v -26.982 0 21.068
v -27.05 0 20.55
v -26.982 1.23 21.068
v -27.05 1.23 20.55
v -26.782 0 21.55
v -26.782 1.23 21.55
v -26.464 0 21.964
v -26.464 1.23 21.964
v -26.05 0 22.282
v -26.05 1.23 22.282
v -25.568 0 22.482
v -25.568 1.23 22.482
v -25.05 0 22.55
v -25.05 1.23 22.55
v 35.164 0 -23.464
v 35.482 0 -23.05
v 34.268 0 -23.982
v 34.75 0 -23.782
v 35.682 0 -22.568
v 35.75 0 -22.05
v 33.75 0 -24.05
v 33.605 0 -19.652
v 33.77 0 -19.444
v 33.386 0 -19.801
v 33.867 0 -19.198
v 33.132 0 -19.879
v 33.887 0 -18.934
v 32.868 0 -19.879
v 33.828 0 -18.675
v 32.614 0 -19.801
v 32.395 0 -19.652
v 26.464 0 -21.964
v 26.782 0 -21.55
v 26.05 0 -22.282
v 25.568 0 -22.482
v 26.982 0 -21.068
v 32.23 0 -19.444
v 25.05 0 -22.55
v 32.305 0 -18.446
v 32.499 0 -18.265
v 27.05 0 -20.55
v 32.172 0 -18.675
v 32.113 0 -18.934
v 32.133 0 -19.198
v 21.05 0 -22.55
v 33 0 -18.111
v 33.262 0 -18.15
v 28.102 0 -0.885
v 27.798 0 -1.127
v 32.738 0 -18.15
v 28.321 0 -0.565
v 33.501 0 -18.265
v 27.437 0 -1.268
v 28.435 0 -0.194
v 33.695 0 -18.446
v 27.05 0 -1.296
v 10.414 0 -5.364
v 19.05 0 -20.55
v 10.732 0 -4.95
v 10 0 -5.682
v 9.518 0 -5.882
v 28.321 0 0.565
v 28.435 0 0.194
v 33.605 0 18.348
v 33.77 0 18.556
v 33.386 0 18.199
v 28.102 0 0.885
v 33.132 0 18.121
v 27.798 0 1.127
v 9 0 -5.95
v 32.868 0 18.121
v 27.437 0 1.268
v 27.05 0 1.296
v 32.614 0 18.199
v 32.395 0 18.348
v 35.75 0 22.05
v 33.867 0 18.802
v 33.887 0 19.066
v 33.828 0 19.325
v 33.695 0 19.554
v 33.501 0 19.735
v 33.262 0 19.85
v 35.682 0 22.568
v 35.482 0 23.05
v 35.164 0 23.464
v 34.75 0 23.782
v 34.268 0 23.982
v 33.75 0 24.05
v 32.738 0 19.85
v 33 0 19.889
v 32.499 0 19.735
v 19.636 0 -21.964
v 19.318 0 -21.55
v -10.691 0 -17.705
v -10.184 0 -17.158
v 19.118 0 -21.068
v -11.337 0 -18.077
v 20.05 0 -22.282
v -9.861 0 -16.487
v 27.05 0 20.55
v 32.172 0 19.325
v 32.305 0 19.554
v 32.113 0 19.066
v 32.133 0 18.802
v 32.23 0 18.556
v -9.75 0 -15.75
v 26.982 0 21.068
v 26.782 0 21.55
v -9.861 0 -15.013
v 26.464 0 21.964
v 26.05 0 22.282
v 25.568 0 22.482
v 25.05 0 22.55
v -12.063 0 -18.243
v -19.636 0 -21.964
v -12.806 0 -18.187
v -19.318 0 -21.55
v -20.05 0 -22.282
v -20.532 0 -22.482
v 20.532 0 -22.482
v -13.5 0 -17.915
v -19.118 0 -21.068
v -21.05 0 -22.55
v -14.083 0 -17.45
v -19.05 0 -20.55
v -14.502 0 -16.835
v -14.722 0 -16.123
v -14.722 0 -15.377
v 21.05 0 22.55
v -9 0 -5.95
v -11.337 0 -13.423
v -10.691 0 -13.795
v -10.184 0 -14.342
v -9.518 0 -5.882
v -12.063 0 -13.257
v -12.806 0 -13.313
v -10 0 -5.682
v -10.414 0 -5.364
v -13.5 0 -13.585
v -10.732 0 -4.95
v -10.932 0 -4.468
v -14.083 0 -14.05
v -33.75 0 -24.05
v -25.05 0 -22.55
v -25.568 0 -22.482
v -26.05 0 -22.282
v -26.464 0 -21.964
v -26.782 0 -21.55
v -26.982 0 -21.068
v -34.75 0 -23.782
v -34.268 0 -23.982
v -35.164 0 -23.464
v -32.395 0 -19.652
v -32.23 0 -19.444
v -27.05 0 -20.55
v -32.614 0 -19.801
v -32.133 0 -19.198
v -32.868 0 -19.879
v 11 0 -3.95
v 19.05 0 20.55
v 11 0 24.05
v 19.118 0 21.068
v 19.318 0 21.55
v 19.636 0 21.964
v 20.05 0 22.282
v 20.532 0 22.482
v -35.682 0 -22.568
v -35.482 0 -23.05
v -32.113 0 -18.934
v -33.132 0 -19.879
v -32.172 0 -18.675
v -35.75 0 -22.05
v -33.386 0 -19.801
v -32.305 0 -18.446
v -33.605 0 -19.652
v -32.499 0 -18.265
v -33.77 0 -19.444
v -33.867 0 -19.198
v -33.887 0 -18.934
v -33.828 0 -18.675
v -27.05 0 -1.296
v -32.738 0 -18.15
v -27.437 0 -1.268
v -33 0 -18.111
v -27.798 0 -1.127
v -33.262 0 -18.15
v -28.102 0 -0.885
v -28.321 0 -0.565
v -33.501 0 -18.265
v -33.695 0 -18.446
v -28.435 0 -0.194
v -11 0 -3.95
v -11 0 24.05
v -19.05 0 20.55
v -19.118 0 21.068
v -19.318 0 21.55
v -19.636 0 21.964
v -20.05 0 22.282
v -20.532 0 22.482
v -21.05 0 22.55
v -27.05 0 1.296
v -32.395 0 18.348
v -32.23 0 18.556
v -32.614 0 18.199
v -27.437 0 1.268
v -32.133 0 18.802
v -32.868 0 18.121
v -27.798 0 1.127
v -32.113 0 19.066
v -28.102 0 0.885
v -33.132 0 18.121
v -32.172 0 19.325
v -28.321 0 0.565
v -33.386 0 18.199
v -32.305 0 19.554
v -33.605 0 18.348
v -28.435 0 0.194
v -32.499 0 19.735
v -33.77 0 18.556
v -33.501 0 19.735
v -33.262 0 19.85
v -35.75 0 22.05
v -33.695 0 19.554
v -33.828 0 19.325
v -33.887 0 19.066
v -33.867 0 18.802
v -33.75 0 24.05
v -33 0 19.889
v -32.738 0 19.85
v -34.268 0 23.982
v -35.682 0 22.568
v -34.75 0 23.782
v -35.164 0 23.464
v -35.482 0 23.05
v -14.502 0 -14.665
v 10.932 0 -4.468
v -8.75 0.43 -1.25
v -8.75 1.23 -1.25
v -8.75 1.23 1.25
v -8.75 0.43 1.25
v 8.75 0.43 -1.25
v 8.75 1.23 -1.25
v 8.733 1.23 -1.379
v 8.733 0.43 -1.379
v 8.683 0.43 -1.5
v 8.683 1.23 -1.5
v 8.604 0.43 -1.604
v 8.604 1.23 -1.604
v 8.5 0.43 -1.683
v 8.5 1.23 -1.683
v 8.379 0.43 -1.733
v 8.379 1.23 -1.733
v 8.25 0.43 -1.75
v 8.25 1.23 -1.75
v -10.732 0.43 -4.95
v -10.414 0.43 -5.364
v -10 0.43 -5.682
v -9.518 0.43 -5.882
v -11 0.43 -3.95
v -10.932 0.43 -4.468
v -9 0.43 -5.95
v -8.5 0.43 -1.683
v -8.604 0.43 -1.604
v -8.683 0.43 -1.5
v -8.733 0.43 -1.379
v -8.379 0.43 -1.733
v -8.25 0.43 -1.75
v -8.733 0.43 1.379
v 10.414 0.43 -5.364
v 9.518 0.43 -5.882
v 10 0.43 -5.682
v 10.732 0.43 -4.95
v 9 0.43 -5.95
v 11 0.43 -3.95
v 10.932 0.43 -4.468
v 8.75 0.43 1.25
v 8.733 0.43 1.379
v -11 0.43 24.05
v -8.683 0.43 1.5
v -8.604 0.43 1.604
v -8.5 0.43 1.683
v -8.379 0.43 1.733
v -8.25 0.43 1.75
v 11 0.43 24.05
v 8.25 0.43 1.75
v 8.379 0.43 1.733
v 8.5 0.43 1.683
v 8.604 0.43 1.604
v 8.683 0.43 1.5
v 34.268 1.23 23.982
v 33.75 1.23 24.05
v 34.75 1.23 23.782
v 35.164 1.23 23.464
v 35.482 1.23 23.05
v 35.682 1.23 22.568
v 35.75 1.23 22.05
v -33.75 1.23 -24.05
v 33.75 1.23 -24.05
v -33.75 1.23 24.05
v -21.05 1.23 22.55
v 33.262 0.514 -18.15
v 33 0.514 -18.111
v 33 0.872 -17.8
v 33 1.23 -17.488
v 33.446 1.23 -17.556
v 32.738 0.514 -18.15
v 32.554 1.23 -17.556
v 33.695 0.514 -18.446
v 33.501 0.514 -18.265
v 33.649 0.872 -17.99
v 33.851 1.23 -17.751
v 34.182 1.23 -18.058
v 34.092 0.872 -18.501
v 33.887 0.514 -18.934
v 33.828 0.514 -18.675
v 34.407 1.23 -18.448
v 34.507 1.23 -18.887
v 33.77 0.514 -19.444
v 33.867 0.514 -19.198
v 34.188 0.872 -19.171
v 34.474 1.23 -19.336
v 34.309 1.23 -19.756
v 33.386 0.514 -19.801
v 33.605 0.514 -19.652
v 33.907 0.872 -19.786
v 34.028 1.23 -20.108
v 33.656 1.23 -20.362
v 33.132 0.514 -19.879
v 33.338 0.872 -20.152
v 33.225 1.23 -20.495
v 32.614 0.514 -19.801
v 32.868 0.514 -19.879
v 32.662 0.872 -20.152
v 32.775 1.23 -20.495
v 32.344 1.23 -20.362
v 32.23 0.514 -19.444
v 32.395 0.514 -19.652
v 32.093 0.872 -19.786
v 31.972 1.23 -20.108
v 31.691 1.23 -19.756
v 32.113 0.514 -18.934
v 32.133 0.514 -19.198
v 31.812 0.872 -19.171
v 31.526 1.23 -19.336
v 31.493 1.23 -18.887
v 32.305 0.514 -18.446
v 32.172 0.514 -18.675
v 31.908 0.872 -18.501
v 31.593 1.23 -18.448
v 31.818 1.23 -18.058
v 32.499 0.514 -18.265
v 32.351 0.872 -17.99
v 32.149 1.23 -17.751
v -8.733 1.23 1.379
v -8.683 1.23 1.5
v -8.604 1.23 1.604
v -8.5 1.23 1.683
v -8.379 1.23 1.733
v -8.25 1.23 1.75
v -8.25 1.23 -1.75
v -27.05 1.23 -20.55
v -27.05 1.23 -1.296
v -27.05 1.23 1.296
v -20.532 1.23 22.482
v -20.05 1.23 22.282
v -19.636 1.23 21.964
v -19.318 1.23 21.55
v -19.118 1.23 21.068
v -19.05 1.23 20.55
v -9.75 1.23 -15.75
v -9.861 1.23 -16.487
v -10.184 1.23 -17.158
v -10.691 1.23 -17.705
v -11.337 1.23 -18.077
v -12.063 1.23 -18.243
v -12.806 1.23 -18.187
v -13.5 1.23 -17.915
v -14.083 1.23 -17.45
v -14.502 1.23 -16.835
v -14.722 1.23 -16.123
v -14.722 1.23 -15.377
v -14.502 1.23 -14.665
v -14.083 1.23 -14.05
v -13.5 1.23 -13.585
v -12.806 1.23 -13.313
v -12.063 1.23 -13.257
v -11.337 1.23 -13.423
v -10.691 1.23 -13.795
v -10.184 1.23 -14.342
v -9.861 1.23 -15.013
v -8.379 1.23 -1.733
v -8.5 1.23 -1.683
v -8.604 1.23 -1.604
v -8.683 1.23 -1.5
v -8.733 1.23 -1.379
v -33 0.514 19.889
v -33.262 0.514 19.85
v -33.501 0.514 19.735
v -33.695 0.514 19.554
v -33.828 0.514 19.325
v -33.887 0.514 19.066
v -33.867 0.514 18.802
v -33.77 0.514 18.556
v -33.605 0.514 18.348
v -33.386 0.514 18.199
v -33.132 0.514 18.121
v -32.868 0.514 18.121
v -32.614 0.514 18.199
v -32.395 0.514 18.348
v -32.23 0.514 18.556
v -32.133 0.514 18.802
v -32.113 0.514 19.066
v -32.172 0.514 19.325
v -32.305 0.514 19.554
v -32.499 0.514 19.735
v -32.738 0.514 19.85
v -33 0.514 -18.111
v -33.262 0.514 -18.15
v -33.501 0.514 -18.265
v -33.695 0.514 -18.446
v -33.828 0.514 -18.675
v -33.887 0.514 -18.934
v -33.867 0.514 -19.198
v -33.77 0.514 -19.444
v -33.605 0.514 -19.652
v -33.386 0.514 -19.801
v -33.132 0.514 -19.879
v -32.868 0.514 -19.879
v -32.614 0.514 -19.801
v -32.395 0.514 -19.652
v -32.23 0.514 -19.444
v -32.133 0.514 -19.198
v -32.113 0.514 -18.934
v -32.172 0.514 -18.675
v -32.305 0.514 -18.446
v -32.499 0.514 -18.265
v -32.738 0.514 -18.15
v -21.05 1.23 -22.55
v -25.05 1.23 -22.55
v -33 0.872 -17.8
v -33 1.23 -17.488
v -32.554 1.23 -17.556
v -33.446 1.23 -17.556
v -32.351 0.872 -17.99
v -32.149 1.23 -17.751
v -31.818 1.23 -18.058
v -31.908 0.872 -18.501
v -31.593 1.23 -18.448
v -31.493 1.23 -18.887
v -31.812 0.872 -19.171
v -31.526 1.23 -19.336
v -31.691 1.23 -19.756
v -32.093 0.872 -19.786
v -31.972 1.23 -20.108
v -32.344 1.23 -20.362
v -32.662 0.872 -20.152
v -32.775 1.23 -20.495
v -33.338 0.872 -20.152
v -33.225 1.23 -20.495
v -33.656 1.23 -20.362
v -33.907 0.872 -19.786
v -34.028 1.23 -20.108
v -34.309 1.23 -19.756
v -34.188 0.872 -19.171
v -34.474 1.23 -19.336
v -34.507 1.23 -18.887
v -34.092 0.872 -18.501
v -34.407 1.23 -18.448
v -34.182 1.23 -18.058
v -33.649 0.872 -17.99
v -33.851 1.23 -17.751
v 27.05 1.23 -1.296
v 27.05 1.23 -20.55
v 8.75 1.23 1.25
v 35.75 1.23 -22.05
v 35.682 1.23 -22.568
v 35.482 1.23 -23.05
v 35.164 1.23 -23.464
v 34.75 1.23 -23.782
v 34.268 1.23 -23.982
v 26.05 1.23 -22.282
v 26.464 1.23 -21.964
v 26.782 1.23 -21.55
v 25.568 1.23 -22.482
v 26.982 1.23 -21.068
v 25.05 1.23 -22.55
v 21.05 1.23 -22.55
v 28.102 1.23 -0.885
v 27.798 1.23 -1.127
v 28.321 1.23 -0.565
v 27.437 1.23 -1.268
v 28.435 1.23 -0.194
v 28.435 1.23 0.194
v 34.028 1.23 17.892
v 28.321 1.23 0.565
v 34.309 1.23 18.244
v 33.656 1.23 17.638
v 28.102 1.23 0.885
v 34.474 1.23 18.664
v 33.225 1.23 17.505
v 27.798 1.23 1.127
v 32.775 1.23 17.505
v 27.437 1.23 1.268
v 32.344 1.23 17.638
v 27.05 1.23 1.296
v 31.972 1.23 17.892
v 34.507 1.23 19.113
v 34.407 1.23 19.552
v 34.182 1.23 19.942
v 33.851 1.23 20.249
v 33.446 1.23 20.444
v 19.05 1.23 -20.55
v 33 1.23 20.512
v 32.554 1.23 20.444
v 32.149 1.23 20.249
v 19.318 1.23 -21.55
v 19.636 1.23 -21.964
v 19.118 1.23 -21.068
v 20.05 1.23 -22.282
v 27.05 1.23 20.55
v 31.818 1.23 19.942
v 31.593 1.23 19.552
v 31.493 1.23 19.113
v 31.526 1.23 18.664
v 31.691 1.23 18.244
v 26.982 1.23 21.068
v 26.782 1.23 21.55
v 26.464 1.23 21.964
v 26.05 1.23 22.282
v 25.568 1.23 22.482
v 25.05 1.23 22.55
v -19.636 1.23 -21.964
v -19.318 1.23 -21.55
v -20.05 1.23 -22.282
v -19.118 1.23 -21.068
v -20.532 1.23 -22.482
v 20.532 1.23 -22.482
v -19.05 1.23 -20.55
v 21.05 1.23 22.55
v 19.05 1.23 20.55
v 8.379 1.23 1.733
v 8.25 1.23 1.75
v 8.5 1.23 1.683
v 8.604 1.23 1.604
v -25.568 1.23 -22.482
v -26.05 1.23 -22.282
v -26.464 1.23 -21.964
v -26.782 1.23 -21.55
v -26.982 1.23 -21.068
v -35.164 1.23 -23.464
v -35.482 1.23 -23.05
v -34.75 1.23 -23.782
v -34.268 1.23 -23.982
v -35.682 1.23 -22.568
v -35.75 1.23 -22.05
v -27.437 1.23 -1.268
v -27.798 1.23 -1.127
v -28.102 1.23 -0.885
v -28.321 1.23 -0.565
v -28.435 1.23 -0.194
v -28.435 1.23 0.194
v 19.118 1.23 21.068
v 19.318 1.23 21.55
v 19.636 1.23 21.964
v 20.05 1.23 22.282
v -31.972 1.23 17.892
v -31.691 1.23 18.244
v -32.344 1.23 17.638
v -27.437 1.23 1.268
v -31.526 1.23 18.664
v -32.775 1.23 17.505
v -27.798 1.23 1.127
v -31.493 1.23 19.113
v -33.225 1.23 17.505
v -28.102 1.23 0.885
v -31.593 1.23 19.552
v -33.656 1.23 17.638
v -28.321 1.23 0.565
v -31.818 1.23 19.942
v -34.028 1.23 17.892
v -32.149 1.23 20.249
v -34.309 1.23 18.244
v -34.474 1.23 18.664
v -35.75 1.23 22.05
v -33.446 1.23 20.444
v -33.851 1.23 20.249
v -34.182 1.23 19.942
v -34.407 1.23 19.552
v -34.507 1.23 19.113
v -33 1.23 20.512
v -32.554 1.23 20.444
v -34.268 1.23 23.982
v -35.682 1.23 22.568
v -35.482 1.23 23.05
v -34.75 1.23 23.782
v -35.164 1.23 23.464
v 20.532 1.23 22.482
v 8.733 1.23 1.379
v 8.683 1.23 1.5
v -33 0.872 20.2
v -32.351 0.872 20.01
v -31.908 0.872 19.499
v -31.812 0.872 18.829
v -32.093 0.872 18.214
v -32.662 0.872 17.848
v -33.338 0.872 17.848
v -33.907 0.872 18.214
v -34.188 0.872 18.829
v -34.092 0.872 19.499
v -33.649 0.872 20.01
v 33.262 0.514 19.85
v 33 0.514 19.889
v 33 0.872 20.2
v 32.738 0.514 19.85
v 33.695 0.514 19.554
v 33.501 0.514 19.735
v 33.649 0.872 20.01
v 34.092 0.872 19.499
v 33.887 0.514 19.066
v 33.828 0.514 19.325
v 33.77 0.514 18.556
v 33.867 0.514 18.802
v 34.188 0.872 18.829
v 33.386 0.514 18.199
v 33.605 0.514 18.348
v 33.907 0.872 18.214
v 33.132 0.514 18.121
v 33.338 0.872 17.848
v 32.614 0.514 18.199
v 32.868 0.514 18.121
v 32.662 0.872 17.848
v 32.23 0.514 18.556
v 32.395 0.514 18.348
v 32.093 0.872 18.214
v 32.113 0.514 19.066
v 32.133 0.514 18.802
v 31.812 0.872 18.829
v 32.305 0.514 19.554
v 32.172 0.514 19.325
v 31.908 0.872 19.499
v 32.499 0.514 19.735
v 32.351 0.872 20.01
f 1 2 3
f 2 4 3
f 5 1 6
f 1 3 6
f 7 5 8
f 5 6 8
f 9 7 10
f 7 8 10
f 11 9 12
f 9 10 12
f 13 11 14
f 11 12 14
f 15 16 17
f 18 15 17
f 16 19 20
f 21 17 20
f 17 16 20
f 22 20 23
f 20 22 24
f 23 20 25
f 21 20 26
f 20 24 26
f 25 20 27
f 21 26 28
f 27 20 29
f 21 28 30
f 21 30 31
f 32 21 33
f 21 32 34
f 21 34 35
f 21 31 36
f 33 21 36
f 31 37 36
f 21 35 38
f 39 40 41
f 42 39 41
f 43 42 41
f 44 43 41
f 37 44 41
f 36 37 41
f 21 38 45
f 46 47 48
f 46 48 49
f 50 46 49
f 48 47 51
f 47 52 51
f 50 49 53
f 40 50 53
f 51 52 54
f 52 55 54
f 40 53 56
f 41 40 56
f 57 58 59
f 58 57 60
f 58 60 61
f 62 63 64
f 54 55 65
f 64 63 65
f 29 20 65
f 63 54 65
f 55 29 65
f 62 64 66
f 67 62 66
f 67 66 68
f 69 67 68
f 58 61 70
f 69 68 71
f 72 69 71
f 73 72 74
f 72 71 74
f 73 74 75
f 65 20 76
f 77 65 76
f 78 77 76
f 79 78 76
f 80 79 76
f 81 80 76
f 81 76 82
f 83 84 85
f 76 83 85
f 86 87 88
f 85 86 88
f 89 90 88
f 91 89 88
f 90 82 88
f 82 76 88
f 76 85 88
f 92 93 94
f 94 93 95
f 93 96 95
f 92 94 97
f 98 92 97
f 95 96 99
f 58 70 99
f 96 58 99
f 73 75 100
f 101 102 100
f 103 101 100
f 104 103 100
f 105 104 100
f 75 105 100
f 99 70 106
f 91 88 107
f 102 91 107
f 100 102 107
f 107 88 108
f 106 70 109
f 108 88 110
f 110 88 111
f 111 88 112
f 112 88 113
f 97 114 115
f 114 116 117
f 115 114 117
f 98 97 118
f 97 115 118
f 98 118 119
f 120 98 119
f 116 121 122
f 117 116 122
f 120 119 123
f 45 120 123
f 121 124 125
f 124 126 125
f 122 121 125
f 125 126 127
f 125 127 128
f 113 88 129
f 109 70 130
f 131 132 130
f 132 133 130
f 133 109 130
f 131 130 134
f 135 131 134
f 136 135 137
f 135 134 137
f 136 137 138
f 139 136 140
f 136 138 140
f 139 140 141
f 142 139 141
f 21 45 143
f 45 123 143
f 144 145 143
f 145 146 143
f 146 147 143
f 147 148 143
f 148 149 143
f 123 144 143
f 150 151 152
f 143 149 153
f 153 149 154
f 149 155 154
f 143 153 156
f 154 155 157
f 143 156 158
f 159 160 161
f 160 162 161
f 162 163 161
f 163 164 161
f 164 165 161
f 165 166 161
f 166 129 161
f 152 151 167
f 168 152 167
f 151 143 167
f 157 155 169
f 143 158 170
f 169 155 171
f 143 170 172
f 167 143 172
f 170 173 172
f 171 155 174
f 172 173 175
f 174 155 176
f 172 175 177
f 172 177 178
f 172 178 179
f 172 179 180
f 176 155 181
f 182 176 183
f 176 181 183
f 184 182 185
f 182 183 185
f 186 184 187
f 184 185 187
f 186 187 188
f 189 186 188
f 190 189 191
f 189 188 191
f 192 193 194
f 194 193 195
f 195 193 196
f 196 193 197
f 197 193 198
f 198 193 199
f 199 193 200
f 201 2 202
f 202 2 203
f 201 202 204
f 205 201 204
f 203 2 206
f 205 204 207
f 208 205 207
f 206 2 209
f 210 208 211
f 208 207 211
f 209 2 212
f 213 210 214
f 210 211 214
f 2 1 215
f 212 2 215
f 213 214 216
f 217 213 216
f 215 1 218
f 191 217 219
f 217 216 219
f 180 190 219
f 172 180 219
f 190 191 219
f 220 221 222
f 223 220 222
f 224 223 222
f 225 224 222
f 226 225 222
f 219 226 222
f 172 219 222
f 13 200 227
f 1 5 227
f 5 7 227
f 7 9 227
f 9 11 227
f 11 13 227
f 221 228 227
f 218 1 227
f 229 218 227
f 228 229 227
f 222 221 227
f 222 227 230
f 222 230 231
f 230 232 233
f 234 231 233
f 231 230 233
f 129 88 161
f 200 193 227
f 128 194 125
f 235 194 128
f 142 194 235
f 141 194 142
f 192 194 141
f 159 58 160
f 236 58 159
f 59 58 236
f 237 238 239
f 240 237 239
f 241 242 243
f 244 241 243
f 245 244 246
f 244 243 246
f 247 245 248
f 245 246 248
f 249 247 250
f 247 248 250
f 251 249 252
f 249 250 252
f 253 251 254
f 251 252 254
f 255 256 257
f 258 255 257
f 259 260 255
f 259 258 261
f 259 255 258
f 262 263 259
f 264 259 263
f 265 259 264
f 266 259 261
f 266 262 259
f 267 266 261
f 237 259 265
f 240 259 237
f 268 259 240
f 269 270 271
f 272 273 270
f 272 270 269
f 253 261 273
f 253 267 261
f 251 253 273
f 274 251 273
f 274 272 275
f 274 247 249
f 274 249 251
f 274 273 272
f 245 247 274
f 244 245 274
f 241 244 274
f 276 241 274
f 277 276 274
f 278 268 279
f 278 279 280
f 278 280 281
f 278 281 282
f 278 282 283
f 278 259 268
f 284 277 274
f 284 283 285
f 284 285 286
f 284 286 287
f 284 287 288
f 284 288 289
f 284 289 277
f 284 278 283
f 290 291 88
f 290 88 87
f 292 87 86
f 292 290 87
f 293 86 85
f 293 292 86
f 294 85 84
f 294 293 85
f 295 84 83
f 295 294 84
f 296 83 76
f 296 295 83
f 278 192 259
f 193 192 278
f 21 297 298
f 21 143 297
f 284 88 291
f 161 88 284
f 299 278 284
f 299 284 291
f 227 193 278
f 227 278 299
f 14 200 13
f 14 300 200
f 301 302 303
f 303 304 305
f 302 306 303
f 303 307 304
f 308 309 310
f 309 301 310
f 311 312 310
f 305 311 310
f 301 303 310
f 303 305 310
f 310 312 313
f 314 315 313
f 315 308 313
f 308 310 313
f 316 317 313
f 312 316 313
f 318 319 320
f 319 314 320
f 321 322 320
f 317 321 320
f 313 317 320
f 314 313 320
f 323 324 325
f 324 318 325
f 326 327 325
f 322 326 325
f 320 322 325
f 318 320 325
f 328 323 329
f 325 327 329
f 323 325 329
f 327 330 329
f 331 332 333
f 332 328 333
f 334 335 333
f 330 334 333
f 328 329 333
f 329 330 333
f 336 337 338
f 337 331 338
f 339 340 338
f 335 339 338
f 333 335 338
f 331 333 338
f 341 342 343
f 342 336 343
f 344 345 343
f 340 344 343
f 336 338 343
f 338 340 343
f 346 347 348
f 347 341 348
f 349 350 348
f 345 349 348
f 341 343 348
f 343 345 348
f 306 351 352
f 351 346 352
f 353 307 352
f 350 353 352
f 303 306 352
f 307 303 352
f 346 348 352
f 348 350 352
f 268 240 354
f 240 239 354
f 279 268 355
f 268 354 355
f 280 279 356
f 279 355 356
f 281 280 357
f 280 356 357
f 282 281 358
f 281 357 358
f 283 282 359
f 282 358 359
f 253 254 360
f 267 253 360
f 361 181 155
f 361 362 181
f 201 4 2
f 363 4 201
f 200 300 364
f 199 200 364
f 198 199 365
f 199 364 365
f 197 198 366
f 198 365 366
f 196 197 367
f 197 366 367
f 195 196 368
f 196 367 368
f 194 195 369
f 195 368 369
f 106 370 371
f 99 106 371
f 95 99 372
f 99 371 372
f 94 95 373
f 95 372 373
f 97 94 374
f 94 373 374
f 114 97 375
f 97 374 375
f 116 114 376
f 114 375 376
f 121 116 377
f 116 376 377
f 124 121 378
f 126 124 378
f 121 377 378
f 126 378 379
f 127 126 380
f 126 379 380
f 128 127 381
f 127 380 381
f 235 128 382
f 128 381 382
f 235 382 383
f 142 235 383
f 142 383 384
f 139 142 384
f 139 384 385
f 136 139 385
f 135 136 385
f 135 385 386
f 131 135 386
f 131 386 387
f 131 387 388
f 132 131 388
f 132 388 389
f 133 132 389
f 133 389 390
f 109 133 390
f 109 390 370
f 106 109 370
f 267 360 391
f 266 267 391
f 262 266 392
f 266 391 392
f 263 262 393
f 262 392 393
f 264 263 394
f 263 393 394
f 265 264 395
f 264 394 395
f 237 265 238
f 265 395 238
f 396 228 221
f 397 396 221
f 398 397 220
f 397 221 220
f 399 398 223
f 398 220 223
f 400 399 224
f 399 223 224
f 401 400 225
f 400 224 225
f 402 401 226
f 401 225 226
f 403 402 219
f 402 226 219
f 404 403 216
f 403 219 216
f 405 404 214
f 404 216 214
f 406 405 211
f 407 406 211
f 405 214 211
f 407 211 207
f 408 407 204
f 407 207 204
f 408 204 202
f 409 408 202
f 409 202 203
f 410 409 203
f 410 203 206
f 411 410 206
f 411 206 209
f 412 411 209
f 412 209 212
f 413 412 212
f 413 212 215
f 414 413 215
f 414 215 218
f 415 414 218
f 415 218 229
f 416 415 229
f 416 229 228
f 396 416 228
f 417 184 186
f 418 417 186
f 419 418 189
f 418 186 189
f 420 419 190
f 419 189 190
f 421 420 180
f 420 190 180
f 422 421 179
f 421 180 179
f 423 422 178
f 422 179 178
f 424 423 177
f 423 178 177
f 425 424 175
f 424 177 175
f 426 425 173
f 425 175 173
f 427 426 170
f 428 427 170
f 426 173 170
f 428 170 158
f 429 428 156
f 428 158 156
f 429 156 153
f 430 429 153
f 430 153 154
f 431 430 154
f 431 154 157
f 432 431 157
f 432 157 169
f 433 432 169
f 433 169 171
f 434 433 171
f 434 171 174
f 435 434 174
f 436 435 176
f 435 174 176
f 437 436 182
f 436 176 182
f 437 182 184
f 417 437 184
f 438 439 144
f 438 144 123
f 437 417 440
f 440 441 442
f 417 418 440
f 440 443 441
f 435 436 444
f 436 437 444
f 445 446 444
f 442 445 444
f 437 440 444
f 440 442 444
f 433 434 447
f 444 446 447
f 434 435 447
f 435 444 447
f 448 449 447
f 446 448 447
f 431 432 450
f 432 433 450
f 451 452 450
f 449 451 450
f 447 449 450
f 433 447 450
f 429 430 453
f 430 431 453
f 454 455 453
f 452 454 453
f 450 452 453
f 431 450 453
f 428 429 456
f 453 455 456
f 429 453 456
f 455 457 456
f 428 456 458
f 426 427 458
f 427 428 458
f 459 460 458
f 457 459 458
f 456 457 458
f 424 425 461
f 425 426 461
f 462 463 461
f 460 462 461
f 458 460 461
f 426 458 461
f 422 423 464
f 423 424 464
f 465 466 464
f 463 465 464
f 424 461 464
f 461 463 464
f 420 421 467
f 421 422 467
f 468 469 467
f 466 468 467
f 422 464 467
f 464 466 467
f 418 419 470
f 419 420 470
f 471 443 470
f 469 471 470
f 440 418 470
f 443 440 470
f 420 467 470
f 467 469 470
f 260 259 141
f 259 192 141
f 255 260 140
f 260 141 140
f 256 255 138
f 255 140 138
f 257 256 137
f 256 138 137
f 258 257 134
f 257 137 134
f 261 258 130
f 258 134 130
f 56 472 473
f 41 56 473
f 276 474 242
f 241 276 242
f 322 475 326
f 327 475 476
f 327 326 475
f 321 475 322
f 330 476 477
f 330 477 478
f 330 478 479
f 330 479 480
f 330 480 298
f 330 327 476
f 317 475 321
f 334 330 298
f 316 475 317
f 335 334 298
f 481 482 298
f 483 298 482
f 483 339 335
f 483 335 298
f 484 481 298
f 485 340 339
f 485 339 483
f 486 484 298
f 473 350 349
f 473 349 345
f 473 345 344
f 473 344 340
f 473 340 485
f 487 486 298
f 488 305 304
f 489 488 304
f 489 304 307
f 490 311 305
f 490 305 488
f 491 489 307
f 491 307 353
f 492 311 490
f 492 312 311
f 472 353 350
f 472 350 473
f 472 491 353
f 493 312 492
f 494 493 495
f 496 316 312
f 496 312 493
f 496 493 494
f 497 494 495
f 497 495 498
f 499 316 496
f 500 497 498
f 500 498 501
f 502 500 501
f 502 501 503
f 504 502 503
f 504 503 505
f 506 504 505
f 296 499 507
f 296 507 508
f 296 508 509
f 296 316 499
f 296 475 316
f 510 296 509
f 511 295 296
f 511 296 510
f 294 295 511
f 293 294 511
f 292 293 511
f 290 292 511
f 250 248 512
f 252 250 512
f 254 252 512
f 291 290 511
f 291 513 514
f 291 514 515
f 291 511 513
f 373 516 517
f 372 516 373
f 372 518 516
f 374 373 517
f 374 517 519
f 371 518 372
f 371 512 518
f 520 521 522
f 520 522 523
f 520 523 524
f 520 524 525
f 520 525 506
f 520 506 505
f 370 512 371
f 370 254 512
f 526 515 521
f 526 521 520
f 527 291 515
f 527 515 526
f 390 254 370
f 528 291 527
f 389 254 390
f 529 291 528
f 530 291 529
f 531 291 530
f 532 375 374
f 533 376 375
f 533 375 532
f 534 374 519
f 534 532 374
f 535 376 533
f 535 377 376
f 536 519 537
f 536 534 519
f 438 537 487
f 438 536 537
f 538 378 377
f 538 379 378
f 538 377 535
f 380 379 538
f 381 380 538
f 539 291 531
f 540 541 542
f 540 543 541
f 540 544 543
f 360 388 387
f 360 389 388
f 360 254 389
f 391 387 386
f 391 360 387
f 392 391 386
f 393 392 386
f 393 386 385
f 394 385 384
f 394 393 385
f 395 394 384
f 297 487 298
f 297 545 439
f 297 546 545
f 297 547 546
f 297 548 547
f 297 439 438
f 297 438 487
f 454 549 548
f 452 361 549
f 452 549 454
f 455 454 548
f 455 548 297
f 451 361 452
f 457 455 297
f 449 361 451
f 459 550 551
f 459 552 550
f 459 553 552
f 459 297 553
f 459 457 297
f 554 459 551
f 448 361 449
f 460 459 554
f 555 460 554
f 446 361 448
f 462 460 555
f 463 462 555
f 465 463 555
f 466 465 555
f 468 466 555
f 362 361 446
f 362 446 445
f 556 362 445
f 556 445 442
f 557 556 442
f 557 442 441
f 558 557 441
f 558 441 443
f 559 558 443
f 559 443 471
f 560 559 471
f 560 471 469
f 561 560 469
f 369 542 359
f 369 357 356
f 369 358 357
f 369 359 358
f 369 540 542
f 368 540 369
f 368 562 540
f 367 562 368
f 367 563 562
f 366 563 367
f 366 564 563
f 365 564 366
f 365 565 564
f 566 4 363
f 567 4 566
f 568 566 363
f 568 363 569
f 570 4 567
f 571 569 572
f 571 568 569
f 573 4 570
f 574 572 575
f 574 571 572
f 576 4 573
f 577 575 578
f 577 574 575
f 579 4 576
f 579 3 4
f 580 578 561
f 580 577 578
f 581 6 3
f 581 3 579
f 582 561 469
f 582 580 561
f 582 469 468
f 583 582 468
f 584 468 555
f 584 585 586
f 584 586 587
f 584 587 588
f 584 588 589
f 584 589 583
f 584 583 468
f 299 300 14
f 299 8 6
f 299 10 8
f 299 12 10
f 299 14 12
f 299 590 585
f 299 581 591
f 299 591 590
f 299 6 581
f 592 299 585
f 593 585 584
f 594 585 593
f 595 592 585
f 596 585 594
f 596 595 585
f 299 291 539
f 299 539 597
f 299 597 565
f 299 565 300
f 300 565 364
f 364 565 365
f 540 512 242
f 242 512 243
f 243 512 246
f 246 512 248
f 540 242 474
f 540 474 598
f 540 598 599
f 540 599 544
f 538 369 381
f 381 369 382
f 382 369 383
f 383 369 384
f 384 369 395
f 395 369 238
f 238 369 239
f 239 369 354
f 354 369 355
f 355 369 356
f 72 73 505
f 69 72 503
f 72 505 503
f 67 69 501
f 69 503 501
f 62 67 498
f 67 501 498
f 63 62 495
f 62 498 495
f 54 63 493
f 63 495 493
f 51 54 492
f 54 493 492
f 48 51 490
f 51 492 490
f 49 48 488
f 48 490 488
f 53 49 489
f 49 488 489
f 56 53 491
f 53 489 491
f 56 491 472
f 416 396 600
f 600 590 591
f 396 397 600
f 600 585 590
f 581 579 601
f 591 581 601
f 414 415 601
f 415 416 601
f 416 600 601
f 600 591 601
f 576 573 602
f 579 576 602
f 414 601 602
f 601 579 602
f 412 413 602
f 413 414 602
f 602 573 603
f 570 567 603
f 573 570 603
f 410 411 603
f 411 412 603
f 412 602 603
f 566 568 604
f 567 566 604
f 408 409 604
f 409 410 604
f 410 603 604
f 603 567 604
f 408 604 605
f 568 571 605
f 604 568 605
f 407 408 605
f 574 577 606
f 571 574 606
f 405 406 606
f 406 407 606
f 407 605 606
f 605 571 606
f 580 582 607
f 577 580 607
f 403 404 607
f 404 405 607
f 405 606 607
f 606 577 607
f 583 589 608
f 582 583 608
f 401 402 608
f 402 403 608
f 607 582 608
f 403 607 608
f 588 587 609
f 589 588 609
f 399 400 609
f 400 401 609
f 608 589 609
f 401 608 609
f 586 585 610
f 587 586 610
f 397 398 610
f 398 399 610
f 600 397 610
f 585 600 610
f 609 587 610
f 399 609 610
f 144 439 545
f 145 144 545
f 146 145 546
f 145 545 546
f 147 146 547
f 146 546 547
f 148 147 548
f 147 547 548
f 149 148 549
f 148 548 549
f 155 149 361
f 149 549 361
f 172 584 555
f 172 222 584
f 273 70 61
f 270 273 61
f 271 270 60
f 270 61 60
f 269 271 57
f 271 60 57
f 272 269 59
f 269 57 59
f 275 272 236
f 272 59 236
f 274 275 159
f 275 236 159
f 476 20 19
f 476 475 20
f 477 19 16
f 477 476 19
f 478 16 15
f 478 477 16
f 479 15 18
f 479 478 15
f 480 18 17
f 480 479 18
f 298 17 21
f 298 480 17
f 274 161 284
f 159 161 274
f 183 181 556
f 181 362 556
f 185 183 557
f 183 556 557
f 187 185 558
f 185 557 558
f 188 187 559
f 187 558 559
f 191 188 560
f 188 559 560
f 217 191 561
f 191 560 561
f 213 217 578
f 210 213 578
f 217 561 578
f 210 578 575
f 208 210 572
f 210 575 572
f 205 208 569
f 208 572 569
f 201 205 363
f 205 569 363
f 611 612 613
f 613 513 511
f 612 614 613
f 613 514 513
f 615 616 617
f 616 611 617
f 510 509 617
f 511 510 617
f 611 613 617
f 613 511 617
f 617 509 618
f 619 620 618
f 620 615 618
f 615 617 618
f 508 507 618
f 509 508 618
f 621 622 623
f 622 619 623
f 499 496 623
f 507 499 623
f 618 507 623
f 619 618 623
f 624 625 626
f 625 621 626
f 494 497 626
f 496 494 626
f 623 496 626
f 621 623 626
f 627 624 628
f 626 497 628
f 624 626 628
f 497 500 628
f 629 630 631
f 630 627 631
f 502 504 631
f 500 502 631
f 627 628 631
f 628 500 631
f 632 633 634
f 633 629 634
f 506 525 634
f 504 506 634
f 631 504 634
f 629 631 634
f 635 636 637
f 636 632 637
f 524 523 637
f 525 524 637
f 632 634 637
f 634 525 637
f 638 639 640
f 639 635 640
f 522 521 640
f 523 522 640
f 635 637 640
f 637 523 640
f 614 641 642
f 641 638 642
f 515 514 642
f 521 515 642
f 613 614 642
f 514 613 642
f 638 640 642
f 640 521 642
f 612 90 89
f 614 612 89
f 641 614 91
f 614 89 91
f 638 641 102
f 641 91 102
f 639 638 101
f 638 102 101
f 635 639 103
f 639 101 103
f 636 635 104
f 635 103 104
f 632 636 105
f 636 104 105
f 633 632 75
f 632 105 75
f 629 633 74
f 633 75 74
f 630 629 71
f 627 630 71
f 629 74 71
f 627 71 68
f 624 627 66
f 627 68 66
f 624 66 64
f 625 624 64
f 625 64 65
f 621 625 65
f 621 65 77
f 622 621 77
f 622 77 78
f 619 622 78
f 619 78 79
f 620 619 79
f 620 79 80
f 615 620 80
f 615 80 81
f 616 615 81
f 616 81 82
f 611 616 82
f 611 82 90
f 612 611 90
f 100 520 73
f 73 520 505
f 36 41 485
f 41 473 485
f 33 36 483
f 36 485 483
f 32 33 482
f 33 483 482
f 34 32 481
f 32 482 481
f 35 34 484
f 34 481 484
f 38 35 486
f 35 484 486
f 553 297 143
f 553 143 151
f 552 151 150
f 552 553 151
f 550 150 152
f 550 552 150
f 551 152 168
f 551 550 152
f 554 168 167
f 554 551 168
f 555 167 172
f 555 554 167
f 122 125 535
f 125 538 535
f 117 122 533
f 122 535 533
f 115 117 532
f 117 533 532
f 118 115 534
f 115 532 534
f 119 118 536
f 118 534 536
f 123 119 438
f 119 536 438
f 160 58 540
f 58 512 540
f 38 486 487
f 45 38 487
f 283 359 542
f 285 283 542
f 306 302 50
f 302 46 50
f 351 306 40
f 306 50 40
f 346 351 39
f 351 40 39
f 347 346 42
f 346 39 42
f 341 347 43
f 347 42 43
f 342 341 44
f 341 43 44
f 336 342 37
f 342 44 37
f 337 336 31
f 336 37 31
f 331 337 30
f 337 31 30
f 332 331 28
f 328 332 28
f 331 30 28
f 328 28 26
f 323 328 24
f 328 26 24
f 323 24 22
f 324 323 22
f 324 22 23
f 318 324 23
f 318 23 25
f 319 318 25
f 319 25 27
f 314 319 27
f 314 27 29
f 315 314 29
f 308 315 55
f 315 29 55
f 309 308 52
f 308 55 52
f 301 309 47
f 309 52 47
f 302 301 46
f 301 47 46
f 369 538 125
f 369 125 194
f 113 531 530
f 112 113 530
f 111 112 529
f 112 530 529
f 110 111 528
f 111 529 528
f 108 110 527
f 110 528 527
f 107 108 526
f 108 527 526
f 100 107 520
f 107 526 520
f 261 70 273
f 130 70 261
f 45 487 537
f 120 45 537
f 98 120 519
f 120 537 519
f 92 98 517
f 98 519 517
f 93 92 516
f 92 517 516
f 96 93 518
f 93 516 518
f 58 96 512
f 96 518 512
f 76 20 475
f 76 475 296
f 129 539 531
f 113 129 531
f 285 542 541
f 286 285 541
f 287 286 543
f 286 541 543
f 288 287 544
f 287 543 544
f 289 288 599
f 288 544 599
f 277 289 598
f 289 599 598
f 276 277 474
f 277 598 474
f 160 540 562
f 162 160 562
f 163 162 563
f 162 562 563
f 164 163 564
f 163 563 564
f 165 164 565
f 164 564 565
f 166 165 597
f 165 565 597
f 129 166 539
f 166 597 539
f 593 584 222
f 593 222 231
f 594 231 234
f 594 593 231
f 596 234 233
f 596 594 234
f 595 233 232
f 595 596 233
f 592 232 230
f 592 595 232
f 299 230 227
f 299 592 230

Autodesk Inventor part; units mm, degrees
ref_plane "YZ Plane" through (0, 0, 0) normal (1, 0, 0) x (0, 1, 0)
ref_plane "XZ Plane" through (0, 0, 0) normal (0, 1, 0) x (-1, 0, 0)
ref_plane "XY Plane" through (0, 0, 0) normal (0, 0, 1) x (1, 0, 0)
sketch "Sketch1" plane through (0, 0, 0) normal (0, 1, 0) x (-1, 0, 0)
  line L0 (-35.75, 24.05) -> (35.75, 24.05)
  line L1 (35.75, 24.05) -> (35.75, -24.05)
  line L2 (35.75, -24.05) -> (-35.75, -24.05)
  line L3 (-35.75, -24.05) -> (-35.75, 24.05)
  line L4 (-35.75, 24.05) -> (35.75, -24.05) construction
  line L5 (35.75, 24.05) -> (-35.75, -24.05) construction
  point P0 (0, 0)
  dimension "d0" = 48.1
  dimension "d1" = 71.5
extrude "Extrusion1" add sketch "Sketch1" along normal blind 1.23
sketch "Sketch2" plane through (0, 1.23, 0) normal (0, 1, 0) x (1, 0, 0)
  point P0 (0, 0)
  point P1 (-33, 19)
  point P2 (33, 19)
  point P3 (-33, -19)
  point P4 (33, -19)
  dimension "d77" = 38
  dimension "d78" = 19
  dimension "d79" = 33
  dimension "d115" = 33
hole "Hole1" at (-33, 1.23, -19) at (33, 1.23, -19) at (-33, 1.23, 19) at (33, 1.23, 19) direction (0, -1, 0) diameter 1.778 end through all countersink diameter 3.023 countersink angle 82 clearance for "Flat Head Machine Screw (82)" size "#0" standard "Ansi Unified Screw Threads"
fillet "Fillet3" radius 2 4 edges at (35.75, 0.615, 24.05) (35.75, 0.615, -24.05) (-35.75, 0.615, -24.05) (-35.75, 0.615, 24.05)
sketch "Sketch10" plane through (0, 1.23, 0) normal (0, 1, 0) x (1, 0, 0)
  line L0 (-27.55, -21) -> (-29.05, -21)
  line L1 (-29.05, -21) -> (-29.05, 21)
  line L2 (-29.05, 21) -> (-27.55, 21)
  line L3 (-27.55, 21) -> (-27.55, -21)
  line L4 (-27.55, -21) -> (-29.05, 21) construction
  line L5 (-29.05, -21) -> (-27.55, 21) construction
  line L6 (0, 13.6561) -> (0, -11.4856)
  line L7 (27.55, -21) -> (29.05, -21)
  line L8 (29.05, -21) -> (29.05, 21)
  line L9 (29.05, 21) -> (27.55, 21)
  line L10 (27.55, 21) -> (27.55, -21)
  line L11 (27.55, -21) -> (29.05, 21) construction
  line L12 (29.05, -21) -> (27.55, 21) construction
  point P0 (0, 0)
  point P1 (-28.3, 0)
  point P2 (-27.55, 0)
  point P3 (28.3, 0)
  point P4 (27.55, 0)
  dimension "d124" = 1.5
  dimension "d125" = 42
  dimension "d126" = 27.55
extrude "Extrusion7" [suppressed]
sketch "Sketch11" plane through (0, 0, 0) normal (0, -1, 0) x (1, 0, 0)
  line L0 (-33.75, 24.05) -> (33.75, 24.05) projected
  line L1 (-11, 24.05) -> (11, 24.05)
  line L2 (11, 24.05) -> (11, -3.95)
  line L3 (9, -5.95) -> (-9, -5.95)
  line L4 (-11, -3.95) -> (-11, 24.05)
  arc A0 (9, -5.95) -> (11, -3.95) centre (9, -3.95) ccw
  arc A1 (-11, -3.95) -> (-9, -5.95) centre (-9, -3.95) ccw
  point P0 (0, 0)
  point P1 (11, -5.95)
  point P2 (-11, -5.95)
  dimension "d129" = 22
  dimension "d130" = 30
  dimension "d131" = 11
  dimension "d132" = 2
extrude "Extrusion8" cut sketch "Sketch11" against normal blind 0.43
sketch "Sketch12" plane through (0, 1.23, 0) normal (0, 1, 0) x (1, 0, 0)
  line L0 (8.25, 1.75) -> (-8.25, 1.75)
  line L1 (-8.75, 1.25) -> (-8.75, -1.25)
  line L2 (-8.25, -1.75) -> (8.25, -1.75)
  line L3 (8.75, -1.25) -> (8.75, 1.25)
  line L4 (8.75, 1.75) -> (-8.75, -1.75) construction
  line L5 (-8.75, 1.75) -> (8.75, -1.75) construction
  arc A0 (-8.75, -1.25) -> (-8.25, -1.75) centre (-8.25, -1.25) ccw
  arc A1 (-8.25, 1.75) -> (-8.75, 1.25) centre (-8.25, 1.25) ccw
  arc A2 (8.25, -1.75) -> (8.75, -1.25) centre (8.25, -1.25) ccw
  arc A3 (8.75, 1.25) -> (8.25, 1.75) centre (8.25, 1.25) ccw
  point P0 (0, 0)
  dimension "d135" = 17.5
  dimension "d136" = 3.5
  dimension "d137" = 0.5
extrude "Extrusion9" cut sketch "Sketch12" against normal through all
sketch "Sketch13" plane through (0, 1.23, 0) normal (0, 1, 0) x (1, 0, 0)
  circle A0 centre (-12.25, 15.75) radius 2.5
  point P0 (0, 0)
  dimension "d161" = 15.75
  dimension "d162" = 12.25
  dimension "d163" = 5
extrude "Extrusion10" cut sketch "Sketch13" against normal through all
sketch "Sketch15" plane through (0, 1.23, 0) normal (0, 1, 0) x (1, 0, 0)
  line L0 (-21.05, -22.55) -> (-25.05, -22.55)
  line L1 (-27.05, -20.55) -> (-27.05, 20.55)
  line L2 (-25.05, 22.55) -> (-21.05, 22.55)
  line L3 (-19.05, 20.55) -> (-19.05, -20.55)
  line L4 (-19.05, -22.55) -> (-27.05, 22.55) construction
  line L5 (-27.05, -22.55) -> (-19.05, 22.55) construction
  arc A0 (-25.05, 22.55) -> (-27.05, 20.55) centre (-25.05, 20.55) ccw
  arc A1 (-27.05, -20.55) -> (-25.05, -22.55) centre (-25.05, -20.55) ccw
  arc A2 (-21.05, -22.55) -> (-19.05, -20.55) centre (-21.05, -20.55) ccw
  arc A3 (-19.05, 20.55) -> (-21.05, 22.55) centre (-21.05, 20.55) ccw
  circle A4 centre (-27.15, 0) radius 1.3
  line L6 (0, 25.2712) -> (0, -27.2079)
  line L7 (21.05, -22.55) -> (25.05, -22.55)
  line L8 (27.05, -20.55) -> (27.05, 20.55)
  line L9 (25.05, 22.55) -> (21.05, 22.55)
  line L10 (19.05, 20.55) -> (19.05, -20.55)
  line L11 (19.05, -22.55) -> (27.05, 22.55) construction
  line L12 (27.05, -22.55) -> (19.05, 22.55) construction
  arc A5 (27.05, 20.55) -> (25.05, 22.55) centre (25.05, 20.55) ccw
  arc A6 (25.05, -22.55) -> (27.05, -20.55) centre (25.05, -20.55) ccw
  arc A7 (19.05, -20.55) -> (21.05, -22.55) centre (21.05, -20.55) ccw
  arc A8 (21.05, 22.55) -> (19.05, 20.55) centre (21.05, 20.55) ccw
  circle A9 centre (27.15, 0) radius 1.3
  point P0 (0, 0)
  point P1 (-23.05, 0)
  point P2 (-27.05, 1.2961)
  point P3 (-27.05, -1.2961)
  point P4 (23.05, 0)
  point P5 (27.05, -1.2961)
  point P6 (27.05, 1.2961)
  dimension "d164" = 45.1
  dimension "d165" = 27.05
  dimension "d166" = 2
  dimension "d167" = 8
  dimension "d170" = 27.15
  dimension "d171" = 2.6
extrude "Extrusion11" cut sketch "Sketch15" against normal through all
equation "\"d78\" = 0.5 * d77"
equation "\"d115\" = d79"
equation "\"d131\" = 0.5 * d129"
properties part number "spacer" material "Stainless Steel"
